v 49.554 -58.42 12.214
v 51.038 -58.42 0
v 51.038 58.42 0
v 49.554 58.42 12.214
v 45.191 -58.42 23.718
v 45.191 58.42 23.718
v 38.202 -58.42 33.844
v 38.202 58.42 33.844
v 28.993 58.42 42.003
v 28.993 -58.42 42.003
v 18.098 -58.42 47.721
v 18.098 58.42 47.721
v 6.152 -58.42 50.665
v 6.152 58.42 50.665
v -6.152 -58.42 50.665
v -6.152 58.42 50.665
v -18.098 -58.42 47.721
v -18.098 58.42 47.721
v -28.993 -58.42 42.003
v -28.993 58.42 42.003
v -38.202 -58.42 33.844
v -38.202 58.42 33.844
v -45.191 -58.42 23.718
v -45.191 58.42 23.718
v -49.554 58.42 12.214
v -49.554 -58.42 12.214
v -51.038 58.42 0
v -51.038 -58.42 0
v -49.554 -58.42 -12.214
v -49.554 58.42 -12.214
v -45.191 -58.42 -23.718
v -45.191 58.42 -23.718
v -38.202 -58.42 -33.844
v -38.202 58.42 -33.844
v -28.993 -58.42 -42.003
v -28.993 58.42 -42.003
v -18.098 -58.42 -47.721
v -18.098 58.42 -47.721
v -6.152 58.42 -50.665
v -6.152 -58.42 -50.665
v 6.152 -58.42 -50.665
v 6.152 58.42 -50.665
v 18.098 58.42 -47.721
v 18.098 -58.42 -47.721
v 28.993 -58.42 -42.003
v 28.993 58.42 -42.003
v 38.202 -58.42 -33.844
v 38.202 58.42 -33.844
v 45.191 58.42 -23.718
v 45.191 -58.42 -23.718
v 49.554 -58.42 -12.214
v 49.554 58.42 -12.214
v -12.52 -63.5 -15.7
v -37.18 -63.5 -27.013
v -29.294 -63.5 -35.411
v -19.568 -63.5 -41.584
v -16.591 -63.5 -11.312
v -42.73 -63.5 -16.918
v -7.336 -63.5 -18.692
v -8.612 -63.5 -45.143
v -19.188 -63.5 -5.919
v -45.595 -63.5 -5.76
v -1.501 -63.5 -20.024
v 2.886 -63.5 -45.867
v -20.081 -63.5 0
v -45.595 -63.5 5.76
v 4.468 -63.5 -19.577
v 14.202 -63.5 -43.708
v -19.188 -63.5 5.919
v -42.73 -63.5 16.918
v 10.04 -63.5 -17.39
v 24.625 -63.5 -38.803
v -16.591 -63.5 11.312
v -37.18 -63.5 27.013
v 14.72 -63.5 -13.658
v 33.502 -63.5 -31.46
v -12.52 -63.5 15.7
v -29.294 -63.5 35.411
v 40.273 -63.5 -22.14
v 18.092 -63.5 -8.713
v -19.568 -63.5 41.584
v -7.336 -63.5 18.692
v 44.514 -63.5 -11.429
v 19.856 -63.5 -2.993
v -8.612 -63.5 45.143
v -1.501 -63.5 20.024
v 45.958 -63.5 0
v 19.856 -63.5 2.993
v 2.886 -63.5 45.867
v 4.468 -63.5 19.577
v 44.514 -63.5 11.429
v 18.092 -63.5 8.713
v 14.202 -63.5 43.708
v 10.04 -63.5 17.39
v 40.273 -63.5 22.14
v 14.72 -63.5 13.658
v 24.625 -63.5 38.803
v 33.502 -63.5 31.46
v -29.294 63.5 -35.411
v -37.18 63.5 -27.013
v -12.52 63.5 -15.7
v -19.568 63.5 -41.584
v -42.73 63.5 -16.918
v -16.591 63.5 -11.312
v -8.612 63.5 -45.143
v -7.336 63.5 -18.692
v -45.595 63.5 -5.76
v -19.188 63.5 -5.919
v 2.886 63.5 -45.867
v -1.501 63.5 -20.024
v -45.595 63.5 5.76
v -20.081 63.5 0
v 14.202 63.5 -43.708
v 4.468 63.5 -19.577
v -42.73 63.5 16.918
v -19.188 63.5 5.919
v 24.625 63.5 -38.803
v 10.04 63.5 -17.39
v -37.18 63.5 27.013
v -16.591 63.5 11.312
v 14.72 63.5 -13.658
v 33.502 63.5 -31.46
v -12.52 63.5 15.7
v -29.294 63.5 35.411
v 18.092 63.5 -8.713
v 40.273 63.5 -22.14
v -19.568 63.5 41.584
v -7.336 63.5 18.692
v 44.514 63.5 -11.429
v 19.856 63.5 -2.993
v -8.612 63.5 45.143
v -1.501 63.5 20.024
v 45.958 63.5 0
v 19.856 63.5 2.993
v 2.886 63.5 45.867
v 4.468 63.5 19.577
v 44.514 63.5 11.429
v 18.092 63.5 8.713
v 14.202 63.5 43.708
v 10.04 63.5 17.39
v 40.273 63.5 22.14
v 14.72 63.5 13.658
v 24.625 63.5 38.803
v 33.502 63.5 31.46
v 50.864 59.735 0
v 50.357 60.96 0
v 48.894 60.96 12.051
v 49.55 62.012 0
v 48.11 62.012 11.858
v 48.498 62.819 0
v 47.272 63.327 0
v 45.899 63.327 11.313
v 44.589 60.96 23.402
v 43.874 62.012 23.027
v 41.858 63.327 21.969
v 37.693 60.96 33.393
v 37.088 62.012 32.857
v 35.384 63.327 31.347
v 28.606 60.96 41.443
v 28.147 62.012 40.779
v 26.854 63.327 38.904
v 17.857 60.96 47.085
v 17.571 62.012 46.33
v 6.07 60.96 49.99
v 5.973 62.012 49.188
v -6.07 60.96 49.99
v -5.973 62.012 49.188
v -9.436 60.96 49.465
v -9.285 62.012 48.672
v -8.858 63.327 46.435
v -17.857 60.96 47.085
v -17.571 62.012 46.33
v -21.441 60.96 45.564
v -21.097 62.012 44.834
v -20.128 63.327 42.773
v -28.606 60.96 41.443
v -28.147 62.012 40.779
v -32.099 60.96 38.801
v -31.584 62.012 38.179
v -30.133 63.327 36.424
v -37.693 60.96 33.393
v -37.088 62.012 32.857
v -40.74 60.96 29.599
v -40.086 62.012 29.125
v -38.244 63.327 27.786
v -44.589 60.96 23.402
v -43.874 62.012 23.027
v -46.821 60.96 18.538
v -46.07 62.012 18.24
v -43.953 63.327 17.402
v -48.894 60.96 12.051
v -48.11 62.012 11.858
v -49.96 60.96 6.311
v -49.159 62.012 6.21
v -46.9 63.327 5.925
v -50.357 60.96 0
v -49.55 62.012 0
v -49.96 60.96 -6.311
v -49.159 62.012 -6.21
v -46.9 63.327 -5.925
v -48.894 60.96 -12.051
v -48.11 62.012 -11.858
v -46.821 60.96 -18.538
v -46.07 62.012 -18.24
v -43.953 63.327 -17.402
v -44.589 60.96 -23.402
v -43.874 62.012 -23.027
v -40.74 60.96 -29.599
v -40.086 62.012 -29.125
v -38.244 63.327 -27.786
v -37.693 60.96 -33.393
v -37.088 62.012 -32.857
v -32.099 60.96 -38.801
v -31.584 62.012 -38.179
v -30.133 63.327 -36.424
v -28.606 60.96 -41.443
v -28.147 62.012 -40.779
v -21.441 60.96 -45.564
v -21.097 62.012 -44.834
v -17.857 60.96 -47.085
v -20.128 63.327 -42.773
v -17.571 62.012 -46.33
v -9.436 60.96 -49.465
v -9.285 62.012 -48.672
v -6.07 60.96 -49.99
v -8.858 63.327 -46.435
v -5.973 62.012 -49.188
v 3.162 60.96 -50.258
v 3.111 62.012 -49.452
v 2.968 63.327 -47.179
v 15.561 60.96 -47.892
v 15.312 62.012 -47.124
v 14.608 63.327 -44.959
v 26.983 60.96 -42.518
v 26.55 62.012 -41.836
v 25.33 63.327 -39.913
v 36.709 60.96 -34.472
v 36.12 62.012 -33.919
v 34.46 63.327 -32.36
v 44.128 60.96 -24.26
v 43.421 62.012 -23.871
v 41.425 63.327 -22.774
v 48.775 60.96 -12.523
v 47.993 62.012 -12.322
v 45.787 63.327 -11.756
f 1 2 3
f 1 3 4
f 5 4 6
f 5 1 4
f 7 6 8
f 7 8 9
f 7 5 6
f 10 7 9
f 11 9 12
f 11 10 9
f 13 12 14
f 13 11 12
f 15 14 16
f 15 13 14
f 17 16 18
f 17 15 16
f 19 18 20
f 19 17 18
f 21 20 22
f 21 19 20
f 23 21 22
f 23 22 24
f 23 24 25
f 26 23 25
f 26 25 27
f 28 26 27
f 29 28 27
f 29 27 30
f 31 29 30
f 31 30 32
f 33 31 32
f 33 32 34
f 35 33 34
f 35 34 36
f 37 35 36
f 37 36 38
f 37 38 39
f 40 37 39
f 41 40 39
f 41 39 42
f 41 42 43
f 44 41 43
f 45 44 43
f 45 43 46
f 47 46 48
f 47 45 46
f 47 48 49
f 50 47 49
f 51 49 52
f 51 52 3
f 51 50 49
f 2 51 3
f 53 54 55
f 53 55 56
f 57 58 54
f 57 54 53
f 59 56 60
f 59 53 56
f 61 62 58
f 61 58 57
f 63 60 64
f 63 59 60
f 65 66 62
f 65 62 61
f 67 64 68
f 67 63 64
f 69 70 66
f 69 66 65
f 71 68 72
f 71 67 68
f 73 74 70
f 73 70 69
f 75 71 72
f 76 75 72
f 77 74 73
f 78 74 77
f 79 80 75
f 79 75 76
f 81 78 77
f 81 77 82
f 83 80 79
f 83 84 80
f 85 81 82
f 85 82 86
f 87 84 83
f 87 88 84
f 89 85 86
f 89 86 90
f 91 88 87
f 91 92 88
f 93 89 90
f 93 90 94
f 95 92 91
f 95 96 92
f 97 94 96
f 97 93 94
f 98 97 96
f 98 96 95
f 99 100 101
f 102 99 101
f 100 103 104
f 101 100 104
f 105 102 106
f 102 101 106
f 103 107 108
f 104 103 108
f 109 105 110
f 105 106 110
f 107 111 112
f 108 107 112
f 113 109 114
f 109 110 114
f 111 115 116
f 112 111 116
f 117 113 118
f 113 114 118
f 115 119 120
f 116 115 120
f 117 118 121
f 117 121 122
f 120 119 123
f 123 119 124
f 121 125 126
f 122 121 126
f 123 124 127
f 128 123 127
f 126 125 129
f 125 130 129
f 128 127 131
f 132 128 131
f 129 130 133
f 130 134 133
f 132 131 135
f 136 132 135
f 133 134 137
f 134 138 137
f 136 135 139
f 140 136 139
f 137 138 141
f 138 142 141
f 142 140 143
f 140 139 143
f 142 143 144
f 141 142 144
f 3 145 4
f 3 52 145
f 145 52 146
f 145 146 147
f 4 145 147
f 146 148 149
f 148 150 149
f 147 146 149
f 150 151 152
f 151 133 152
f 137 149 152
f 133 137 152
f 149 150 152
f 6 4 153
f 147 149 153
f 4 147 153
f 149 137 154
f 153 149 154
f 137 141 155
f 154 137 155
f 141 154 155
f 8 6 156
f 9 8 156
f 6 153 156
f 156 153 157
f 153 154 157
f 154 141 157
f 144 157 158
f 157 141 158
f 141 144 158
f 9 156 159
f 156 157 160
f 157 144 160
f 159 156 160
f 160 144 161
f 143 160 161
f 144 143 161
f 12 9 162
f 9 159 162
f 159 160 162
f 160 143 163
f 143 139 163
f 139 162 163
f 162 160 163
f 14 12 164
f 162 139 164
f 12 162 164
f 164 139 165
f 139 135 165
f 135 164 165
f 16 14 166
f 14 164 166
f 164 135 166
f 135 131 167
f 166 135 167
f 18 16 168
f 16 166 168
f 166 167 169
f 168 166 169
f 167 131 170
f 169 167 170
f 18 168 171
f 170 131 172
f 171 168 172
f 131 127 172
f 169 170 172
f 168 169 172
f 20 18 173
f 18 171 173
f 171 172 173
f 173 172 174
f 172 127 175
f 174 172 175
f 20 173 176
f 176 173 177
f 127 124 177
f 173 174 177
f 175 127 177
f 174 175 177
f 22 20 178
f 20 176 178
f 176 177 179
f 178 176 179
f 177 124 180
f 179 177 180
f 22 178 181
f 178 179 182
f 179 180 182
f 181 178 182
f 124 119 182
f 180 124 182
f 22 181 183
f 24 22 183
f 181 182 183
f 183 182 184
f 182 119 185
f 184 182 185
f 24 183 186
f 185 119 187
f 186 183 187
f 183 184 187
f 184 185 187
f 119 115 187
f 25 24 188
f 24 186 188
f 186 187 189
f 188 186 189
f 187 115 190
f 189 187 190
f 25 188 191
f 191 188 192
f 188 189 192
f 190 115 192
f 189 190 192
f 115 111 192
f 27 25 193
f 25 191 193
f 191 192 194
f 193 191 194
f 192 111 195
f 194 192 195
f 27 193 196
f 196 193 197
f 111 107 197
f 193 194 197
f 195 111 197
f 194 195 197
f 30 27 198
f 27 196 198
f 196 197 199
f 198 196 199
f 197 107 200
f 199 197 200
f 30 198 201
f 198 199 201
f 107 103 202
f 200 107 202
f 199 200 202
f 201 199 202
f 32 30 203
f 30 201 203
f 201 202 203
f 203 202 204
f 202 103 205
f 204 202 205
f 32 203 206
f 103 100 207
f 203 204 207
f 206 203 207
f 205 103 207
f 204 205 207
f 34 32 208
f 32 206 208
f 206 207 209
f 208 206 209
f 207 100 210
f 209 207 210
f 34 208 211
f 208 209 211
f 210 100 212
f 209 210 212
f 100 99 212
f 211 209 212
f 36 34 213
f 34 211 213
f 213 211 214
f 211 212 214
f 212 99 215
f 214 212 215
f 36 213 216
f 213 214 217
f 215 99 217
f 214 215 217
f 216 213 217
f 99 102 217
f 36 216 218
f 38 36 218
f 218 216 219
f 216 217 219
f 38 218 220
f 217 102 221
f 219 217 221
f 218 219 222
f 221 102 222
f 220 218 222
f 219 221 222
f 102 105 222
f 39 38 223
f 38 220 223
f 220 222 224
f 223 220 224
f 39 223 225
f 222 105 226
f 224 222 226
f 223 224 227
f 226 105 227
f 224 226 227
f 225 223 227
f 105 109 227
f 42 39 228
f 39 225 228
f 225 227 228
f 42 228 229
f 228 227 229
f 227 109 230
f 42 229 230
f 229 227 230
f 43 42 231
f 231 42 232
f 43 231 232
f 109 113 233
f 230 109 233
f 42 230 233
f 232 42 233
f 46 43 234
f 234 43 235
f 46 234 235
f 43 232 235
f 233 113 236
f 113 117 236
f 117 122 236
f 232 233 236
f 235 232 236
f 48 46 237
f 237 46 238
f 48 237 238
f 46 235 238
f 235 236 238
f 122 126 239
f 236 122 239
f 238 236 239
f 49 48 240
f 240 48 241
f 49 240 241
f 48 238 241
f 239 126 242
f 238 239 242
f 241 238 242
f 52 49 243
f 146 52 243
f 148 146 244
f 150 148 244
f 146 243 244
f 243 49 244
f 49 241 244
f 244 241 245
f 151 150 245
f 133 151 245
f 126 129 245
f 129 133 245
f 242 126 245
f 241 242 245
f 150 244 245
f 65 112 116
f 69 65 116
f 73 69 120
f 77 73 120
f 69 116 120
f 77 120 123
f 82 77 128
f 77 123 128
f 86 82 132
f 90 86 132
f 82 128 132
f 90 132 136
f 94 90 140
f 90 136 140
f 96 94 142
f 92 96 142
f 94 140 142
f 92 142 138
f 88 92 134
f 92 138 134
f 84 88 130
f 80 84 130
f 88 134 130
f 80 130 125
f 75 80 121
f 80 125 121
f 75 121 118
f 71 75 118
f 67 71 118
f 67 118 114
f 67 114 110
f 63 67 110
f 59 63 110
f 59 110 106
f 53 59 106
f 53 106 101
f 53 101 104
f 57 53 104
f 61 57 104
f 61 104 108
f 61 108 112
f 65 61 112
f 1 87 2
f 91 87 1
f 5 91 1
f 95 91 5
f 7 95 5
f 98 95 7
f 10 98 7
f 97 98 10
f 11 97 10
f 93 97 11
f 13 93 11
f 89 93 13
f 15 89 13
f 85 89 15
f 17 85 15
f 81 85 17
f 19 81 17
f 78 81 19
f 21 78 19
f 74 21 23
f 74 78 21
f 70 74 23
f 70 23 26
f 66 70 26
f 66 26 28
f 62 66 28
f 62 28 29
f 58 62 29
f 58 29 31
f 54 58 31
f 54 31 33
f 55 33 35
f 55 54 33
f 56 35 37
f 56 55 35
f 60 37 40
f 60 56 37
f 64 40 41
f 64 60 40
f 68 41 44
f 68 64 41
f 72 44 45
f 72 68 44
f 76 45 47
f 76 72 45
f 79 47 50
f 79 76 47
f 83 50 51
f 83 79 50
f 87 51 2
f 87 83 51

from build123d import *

# Parameters (mm, degrees)
F0_R     = 51.037505
F1_DEPTH = 63.5
F2_SIZE  = 5.08
F3_R     = 5.08
F4_R     = 20.080575
F5_DEPTH = 127.001


with BuildPart() as f1:
    # F0 (on Front) → F1 (new body, symmetric)
    with BuildSketch(Plane.XZ):
        Circle(F0_R)
    extrude(amount=F1_DEPTH, both=True)

    # F2
    f2_edges = [f1.edges().sort_by_distance(p)[0] for p in [
        (-51.037505, -63.5, 0),
    ]]
    chamfer(f2_edges, length=F2_SIZE)

    # F3
    f3_edges = [f1.edges().sort_by_distance(p)[0] for p in [
        (-51.037505, 63.5, 0),
    ]]
    fillet(f3_edges, radius=F3_R)

    # F4 (on face) → F5 (cut, through all)
    with BuildSketch(Plane(origin=(0, 63.5, 0), x_dir=(-1, 0, 0), z_dir=(0, 1, 0))):
        Circle(F4_R)
    extrude(amount=-F5_DEPTH, mode=Mode.SUBTRACT)


solid = f1.part
